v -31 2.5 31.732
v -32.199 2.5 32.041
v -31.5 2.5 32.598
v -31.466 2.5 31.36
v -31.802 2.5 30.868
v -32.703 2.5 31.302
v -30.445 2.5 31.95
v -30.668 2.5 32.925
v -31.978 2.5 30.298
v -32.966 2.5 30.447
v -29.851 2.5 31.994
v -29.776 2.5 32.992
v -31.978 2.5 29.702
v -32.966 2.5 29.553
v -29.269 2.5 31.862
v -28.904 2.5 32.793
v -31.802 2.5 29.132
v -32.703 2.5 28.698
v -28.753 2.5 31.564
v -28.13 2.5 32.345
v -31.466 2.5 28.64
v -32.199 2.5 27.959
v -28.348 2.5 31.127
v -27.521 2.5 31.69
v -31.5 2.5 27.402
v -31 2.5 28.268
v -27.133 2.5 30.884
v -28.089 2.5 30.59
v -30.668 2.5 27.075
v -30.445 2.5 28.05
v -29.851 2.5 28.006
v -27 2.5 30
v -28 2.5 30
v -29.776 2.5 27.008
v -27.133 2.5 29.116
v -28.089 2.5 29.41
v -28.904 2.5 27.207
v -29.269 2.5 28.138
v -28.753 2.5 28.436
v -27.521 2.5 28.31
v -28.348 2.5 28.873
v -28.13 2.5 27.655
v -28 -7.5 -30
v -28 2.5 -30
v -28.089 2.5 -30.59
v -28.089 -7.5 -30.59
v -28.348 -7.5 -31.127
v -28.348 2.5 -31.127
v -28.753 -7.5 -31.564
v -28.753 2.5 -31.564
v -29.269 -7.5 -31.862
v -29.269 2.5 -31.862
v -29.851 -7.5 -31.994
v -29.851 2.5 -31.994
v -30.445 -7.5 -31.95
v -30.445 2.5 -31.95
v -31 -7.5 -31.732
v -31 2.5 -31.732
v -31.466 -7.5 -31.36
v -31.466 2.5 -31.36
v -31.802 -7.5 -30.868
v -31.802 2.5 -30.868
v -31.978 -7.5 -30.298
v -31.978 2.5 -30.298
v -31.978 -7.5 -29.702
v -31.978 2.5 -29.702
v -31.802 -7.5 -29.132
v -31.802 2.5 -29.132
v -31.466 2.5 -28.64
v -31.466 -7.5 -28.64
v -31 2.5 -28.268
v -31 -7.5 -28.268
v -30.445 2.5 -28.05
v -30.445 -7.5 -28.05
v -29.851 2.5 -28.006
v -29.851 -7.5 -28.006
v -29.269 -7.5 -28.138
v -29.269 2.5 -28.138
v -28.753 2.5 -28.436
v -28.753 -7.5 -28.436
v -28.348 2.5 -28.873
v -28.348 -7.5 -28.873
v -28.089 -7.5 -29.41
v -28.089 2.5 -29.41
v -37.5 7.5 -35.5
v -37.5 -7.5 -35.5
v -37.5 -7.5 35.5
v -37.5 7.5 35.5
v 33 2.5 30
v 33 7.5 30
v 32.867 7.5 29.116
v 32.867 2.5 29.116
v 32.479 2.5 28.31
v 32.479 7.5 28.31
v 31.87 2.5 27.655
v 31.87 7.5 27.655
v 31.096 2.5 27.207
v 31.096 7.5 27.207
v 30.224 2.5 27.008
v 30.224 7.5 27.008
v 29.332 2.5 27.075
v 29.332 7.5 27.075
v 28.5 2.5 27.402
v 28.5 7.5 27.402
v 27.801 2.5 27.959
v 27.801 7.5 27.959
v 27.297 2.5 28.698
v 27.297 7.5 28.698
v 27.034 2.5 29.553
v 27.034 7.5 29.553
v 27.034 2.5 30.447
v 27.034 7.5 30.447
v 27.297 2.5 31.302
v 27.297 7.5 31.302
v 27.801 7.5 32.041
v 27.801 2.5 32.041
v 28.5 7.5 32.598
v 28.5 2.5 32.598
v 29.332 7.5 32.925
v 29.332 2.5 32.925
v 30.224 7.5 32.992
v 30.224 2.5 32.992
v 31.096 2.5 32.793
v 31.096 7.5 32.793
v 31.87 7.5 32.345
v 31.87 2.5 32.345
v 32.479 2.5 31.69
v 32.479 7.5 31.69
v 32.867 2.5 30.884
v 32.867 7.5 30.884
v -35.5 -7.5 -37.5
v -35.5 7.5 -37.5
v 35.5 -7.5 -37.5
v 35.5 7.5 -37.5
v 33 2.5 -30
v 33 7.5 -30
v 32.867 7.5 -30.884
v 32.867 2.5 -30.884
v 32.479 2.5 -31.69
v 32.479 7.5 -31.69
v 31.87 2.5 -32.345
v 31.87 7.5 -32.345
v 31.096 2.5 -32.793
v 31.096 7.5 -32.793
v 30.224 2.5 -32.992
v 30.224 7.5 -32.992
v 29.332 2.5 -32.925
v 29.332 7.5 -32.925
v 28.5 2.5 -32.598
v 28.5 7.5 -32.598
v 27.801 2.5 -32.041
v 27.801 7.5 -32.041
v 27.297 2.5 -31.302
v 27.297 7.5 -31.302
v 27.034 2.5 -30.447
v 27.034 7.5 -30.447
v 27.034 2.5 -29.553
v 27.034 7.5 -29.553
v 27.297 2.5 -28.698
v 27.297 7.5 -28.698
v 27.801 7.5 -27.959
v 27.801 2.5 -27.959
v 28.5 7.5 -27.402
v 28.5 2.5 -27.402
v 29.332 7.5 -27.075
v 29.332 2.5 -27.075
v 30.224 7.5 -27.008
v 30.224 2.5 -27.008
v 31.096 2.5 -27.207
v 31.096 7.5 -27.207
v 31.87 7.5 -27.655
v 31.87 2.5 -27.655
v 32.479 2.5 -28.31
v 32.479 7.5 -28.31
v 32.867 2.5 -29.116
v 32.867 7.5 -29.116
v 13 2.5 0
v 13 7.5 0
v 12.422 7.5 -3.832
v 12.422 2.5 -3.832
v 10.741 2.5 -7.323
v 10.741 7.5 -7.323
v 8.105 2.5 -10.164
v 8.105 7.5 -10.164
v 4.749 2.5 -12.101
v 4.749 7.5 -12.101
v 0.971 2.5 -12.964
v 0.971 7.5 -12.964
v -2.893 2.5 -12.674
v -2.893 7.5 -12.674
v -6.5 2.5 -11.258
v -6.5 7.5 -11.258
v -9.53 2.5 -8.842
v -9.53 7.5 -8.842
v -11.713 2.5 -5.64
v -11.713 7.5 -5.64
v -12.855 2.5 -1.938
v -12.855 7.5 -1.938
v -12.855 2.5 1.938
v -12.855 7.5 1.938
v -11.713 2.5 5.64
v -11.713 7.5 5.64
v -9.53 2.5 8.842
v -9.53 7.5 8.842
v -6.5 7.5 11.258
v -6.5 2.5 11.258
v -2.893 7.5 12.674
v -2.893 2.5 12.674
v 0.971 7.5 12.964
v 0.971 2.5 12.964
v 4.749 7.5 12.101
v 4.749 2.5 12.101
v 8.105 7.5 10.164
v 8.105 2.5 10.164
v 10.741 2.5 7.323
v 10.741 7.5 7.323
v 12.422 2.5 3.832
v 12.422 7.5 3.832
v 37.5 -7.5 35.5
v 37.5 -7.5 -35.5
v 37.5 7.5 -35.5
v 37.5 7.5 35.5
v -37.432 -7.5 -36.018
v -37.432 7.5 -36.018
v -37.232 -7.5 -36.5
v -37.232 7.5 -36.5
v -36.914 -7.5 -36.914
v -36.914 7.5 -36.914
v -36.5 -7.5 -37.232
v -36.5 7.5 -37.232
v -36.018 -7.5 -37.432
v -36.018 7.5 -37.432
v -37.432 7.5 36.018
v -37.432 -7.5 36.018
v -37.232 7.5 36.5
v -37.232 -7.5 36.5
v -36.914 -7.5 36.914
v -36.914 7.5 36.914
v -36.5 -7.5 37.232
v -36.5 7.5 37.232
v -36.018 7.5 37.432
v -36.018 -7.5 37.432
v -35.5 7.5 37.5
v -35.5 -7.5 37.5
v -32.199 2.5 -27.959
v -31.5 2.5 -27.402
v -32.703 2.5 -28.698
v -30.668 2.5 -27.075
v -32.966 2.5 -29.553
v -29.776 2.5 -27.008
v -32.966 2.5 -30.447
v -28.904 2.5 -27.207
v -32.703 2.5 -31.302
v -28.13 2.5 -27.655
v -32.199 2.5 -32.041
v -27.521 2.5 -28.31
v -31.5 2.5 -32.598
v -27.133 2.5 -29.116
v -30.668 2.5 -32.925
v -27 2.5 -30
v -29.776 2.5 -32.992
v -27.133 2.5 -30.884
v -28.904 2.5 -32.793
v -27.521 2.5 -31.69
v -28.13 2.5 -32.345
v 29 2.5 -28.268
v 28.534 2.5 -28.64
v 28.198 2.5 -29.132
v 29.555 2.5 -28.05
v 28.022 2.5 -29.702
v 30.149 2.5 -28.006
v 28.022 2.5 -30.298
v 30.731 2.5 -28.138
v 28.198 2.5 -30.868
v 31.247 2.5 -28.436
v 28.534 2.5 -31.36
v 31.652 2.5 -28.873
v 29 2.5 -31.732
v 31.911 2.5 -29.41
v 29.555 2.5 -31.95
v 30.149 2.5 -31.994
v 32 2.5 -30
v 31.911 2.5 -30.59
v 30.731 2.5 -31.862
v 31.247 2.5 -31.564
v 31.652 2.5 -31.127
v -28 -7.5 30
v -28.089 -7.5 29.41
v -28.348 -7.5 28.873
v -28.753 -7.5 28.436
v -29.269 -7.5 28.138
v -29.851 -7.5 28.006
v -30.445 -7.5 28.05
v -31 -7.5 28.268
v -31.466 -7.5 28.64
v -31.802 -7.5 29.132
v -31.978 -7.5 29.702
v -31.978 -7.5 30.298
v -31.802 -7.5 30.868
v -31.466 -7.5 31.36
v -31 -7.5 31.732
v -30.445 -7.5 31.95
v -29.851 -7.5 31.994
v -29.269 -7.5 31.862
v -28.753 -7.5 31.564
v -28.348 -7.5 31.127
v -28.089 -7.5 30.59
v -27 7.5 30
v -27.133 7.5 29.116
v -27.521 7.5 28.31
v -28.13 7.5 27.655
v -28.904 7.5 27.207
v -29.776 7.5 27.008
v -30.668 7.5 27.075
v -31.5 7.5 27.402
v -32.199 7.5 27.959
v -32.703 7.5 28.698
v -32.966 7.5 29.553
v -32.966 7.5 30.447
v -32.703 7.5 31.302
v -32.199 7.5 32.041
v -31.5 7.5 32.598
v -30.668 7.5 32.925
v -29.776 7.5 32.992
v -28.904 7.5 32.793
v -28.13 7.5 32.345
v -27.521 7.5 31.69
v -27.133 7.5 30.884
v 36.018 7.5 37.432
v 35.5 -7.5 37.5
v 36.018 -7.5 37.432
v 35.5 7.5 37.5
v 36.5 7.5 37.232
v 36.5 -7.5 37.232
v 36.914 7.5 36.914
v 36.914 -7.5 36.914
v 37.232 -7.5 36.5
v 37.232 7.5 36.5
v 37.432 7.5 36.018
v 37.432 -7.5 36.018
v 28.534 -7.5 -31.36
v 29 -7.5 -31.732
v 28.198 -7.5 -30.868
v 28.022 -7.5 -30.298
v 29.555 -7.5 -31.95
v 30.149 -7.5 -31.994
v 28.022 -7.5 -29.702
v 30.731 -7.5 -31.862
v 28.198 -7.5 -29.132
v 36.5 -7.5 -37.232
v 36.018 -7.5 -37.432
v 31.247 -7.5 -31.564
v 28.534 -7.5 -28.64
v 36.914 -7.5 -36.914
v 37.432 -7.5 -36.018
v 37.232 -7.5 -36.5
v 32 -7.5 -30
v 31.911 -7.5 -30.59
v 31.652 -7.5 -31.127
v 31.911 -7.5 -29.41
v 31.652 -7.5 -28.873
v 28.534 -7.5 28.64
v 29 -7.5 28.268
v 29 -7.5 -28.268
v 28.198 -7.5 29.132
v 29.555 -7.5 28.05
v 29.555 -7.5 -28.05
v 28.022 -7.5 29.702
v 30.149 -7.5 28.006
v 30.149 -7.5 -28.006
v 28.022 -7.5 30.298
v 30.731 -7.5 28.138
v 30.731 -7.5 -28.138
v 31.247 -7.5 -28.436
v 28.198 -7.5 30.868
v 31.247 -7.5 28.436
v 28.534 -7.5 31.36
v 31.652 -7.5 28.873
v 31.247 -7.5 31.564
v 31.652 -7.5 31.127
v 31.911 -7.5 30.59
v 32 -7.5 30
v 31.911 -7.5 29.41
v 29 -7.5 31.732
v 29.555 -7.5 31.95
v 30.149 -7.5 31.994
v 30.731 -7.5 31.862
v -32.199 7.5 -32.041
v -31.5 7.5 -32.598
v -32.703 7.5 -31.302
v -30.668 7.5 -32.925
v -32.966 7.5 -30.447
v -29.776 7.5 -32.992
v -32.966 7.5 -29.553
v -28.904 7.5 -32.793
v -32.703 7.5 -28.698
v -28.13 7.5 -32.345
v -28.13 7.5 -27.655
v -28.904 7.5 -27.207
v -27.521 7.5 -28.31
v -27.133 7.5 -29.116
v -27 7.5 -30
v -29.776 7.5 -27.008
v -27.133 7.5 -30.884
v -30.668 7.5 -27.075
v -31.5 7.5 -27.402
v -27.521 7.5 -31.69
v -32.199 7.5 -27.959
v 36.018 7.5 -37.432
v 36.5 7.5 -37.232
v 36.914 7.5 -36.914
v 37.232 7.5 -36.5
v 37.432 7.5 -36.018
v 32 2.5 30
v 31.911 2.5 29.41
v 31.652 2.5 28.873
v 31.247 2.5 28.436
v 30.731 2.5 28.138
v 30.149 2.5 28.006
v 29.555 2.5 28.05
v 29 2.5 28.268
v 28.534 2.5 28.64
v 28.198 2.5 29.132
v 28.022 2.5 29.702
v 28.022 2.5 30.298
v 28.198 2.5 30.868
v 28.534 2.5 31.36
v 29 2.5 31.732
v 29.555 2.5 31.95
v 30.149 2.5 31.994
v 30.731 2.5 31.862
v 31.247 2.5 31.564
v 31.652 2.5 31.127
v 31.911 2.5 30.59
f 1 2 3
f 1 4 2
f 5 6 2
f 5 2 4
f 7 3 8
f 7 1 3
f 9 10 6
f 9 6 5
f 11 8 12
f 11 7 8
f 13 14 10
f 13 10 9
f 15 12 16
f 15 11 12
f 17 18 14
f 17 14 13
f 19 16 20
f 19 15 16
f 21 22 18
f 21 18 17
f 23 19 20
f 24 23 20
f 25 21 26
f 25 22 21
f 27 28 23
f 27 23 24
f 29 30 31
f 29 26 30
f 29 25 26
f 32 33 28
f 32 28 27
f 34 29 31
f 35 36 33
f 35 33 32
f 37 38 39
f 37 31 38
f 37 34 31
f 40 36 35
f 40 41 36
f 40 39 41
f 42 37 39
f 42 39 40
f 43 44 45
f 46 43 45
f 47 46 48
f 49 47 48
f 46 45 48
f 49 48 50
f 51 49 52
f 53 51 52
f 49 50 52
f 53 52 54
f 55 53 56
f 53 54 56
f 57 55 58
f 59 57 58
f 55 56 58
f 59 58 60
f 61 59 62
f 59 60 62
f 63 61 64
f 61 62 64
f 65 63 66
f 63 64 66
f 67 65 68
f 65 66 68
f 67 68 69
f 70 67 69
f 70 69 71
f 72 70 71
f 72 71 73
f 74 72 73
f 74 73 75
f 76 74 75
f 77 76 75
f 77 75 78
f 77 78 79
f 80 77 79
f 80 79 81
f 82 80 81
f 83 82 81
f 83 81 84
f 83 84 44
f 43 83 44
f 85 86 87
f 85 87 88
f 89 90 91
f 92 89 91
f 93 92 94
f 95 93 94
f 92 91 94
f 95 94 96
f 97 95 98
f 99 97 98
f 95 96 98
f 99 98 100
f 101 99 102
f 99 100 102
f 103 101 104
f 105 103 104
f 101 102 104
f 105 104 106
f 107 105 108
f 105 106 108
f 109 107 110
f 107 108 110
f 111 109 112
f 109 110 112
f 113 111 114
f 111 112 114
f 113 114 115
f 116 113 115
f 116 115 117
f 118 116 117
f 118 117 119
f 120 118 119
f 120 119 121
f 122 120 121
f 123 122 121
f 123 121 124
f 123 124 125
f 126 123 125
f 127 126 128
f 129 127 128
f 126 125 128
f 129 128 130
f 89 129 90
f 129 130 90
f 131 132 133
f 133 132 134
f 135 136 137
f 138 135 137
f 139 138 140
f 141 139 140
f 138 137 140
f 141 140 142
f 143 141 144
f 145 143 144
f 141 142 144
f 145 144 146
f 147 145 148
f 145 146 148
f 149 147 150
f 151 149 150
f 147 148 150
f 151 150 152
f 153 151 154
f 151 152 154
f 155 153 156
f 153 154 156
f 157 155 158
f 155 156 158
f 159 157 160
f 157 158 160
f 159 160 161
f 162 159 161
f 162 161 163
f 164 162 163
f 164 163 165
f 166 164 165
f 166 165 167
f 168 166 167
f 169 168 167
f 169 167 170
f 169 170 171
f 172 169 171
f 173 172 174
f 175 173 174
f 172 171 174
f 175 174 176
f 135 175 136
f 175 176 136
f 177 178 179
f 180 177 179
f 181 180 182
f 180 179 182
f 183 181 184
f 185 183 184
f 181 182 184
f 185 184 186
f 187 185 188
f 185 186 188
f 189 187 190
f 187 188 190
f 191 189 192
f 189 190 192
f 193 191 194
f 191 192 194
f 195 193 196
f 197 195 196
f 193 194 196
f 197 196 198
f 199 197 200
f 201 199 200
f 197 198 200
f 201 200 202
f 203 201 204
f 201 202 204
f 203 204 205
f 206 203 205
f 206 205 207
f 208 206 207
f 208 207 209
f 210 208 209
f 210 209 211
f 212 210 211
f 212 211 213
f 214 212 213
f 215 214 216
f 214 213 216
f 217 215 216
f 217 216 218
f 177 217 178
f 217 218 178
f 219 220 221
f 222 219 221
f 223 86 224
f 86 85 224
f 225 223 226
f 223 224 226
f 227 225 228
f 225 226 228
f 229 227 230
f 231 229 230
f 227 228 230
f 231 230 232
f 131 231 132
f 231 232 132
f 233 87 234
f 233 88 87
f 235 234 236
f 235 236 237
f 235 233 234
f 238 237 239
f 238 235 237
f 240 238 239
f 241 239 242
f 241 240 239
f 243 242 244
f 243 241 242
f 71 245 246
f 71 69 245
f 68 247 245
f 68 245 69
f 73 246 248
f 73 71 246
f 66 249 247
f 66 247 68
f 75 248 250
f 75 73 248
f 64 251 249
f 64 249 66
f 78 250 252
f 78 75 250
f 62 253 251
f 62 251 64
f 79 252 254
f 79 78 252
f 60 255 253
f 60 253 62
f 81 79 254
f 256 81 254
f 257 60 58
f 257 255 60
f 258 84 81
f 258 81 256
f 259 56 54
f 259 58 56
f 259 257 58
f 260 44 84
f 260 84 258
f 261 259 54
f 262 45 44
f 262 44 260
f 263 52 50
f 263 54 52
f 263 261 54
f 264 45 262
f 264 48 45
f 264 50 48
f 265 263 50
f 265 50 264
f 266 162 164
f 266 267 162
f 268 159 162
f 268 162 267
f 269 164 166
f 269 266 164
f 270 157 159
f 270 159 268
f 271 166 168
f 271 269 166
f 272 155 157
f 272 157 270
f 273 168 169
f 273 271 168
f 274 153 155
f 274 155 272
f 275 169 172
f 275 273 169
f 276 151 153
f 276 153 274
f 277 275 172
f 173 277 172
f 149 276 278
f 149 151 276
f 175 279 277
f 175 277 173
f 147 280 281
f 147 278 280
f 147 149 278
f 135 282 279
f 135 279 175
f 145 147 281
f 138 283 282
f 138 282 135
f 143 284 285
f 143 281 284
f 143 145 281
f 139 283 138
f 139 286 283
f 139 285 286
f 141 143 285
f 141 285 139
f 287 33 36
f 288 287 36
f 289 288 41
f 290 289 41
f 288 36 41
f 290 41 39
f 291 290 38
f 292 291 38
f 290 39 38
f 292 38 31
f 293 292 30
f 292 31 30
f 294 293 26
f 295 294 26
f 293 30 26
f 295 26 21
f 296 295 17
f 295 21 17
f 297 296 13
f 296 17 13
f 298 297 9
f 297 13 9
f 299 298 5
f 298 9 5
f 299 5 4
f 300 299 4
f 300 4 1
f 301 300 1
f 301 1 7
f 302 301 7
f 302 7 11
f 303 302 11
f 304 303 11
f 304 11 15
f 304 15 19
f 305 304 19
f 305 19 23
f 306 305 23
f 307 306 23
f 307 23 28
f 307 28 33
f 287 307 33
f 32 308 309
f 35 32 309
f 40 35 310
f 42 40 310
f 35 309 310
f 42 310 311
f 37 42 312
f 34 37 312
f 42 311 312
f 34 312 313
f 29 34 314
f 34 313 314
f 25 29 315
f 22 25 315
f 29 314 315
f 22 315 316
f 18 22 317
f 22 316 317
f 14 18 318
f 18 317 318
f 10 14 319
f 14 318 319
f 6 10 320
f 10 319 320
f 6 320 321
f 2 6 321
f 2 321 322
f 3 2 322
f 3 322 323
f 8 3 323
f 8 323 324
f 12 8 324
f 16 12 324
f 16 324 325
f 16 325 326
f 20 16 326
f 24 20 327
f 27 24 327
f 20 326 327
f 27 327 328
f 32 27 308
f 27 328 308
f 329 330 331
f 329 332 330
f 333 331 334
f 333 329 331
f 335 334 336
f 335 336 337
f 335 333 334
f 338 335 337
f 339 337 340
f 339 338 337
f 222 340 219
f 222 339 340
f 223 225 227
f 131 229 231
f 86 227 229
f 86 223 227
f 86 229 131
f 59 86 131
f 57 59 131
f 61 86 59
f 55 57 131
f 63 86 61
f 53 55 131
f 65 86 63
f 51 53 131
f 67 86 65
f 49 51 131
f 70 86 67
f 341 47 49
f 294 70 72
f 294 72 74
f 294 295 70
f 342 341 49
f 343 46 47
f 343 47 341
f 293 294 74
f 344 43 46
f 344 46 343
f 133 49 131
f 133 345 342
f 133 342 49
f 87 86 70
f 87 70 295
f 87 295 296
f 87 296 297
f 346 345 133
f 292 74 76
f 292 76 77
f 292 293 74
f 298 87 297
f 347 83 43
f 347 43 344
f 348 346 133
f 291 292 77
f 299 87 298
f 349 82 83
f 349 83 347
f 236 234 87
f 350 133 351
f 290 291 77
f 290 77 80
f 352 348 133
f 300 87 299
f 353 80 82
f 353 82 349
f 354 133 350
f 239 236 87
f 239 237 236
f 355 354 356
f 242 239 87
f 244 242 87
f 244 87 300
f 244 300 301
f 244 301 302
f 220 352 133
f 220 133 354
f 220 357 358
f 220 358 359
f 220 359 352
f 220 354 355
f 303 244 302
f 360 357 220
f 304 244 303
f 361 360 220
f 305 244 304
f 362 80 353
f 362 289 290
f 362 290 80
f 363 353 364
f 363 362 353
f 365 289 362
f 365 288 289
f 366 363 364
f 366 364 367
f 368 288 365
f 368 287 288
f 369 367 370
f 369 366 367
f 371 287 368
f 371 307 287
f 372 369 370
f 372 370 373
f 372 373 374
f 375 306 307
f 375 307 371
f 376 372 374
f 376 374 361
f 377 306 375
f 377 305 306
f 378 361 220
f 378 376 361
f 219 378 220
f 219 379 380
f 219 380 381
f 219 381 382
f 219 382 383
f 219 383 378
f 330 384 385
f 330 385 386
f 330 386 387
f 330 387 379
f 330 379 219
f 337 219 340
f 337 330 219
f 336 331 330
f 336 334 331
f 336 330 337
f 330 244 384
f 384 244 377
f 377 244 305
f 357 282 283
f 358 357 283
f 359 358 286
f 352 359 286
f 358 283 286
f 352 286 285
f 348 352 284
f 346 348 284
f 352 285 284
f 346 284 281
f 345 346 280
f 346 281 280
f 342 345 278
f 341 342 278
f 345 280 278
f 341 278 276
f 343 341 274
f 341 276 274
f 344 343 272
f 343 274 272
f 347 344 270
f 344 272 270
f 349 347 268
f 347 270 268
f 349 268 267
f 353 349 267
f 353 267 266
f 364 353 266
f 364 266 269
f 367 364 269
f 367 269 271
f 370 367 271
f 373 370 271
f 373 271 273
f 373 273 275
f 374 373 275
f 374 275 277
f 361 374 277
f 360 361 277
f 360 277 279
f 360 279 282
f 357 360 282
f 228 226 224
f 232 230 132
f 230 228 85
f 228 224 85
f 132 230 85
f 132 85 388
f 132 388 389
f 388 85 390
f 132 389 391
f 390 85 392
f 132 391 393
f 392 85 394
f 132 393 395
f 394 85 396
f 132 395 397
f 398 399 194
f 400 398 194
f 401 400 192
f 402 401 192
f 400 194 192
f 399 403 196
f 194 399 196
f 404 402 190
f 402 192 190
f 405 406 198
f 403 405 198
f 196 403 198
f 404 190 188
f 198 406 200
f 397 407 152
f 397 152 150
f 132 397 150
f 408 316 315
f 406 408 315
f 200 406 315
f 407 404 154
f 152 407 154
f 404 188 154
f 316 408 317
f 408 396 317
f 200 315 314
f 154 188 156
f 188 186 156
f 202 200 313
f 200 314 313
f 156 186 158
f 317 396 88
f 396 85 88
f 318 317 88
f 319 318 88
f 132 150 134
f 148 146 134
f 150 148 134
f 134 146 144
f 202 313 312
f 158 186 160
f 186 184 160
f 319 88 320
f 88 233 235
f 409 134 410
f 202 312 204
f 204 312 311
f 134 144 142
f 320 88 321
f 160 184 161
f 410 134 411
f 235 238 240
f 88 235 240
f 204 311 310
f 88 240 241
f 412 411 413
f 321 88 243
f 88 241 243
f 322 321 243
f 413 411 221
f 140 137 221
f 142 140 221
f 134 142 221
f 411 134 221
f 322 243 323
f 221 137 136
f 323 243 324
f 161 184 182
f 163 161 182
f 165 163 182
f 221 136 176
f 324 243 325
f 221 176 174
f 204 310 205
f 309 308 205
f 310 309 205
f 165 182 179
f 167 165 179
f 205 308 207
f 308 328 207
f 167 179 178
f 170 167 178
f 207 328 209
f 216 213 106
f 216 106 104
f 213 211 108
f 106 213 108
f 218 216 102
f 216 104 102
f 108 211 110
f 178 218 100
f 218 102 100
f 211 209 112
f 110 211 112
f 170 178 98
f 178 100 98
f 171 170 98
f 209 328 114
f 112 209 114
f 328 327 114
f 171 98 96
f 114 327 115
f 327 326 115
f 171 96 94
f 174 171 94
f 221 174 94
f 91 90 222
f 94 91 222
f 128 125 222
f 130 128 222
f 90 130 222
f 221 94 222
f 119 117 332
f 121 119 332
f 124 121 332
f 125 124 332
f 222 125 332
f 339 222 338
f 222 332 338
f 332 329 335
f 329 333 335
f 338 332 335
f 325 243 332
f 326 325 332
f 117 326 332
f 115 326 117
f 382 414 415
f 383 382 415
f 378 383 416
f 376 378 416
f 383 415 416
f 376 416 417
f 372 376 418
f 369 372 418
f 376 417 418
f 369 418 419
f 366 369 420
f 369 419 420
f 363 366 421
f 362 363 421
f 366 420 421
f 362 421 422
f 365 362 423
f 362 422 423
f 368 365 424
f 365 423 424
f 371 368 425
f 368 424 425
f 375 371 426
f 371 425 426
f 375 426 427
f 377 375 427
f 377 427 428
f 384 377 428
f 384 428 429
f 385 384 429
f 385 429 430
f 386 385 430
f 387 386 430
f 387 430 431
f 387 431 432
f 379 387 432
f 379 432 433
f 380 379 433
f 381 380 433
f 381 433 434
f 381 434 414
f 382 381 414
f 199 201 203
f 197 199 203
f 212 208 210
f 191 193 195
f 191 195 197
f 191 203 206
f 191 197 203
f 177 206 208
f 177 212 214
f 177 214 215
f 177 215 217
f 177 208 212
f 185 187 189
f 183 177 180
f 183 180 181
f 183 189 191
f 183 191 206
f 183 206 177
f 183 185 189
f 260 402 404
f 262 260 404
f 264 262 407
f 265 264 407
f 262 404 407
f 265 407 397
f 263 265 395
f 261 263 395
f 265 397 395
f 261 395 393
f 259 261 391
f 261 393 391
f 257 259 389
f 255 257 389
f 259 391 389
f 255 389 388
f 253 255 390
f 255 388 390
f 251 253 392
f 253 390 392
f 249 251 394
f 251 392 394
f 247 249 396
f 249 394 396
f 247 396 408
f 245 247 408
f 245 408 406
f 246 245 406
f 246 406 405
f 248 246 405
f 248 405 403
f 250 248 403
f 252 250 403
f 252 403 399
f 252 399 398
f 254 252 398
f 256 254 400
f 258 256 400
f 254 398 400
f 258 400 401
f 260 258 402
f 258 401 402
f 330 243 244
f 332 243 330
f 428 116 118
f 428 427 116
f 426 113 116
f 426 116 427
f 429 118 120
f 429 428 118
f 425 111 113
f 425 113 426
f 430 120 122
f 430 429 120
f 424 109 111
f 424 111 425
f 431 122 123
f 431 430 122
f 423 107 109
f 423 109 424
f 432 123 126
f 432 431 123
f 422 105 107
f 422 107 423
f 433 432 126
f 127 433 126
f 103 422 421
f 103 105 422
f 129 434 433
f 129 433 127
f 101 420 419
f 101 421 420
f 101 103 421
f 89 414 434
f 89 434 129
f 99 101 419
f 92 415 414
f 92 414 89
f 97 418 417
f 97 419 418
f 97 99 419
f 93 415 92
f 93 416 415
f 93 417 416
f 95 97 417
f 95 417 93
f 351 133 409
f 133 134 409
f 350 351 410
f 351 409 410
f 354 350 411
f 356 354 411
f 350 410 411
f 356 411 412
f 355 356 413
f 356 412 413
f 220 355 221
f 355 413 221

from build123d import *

# Parameters (mm, degrees)
SKETCH1_W           = 75
SKETCH1_H           = 15
BOSS_EXTRUDE1_DEPTH = 37.5
SKETCH2_R           = 13
SKETCH2_R_2         = 3
CUT_EXTRUDE1_DEPTH  = 5
SKETCH3_R           = 2
CUT_EXTRUDE2_DEPTH  = 11
FILLET1_R           = 2


with BuildPart() as part:
    # Sketch1 → Boss-Extrude1 (new body, symmetric)
    with BuildSketch(Plane.XY):
        Rectangle(SKETCH1_W, SKETCH1_H)
    extrude(amount=BOSS_EXTRUDE1_DEPTH, both=True)

    # Sketch2 → Cut-Extrude1 (cut)
    with BuildSketch(Plane(origin=(0, 7.5, 0), x_dir=(1, 0, 0), z_dir=(0, 1, 0))):
        Circle(SKETCH2_R)
        with Locations((-30, 30)):
            Circle(SKETCH2_R_2)
        with Locations((-30, -30)):
            Circle(SKETCH2_R_2)
        with Locations((30, -30)):
            Circle(SKETCH2_R_2)
        with Locations((30, 30)):
            Circle(SKETCH2_R_2)
    extrude(amount=-CUT_EXTRUDE1_DEPTH, mode=Mode.SUBTRACT)

    # Sketch3 → Cut-Extrude2 (cut, through all)
    with BuildSketch(Plane(origin=(0, 2.5, 0), x_dir=(1, 0, 0), z_dir=(0, 1, 0))):
        with Locations((-30, 30)):
            Circle(SKETCH3_R)
        with Locations((30, 30)):
            Circle(SKETCH3_R)
        with Locations((30, -30)):
            Circle(SKETCH3_R)
        with Locations((-30, -30)):
            Circle(SKETCH3_R)
    extrude(amount=-CUT_EXTRUDE2_DEPTH, mode=Mode.SUBTRACT)

    # Fillet1
    fillet1_edges = [part.edges().sort_by_distance(p)[0] for p in [
        (-37.5, 0, 37.5),
        (37.5, 0, 37.5),
        (-37.5, 0, -37.5),
        (37.5, 0, -37.5),
    ]]
    fillet(fillet1_edges, radius=FILLET1_R)


solid = part.part
